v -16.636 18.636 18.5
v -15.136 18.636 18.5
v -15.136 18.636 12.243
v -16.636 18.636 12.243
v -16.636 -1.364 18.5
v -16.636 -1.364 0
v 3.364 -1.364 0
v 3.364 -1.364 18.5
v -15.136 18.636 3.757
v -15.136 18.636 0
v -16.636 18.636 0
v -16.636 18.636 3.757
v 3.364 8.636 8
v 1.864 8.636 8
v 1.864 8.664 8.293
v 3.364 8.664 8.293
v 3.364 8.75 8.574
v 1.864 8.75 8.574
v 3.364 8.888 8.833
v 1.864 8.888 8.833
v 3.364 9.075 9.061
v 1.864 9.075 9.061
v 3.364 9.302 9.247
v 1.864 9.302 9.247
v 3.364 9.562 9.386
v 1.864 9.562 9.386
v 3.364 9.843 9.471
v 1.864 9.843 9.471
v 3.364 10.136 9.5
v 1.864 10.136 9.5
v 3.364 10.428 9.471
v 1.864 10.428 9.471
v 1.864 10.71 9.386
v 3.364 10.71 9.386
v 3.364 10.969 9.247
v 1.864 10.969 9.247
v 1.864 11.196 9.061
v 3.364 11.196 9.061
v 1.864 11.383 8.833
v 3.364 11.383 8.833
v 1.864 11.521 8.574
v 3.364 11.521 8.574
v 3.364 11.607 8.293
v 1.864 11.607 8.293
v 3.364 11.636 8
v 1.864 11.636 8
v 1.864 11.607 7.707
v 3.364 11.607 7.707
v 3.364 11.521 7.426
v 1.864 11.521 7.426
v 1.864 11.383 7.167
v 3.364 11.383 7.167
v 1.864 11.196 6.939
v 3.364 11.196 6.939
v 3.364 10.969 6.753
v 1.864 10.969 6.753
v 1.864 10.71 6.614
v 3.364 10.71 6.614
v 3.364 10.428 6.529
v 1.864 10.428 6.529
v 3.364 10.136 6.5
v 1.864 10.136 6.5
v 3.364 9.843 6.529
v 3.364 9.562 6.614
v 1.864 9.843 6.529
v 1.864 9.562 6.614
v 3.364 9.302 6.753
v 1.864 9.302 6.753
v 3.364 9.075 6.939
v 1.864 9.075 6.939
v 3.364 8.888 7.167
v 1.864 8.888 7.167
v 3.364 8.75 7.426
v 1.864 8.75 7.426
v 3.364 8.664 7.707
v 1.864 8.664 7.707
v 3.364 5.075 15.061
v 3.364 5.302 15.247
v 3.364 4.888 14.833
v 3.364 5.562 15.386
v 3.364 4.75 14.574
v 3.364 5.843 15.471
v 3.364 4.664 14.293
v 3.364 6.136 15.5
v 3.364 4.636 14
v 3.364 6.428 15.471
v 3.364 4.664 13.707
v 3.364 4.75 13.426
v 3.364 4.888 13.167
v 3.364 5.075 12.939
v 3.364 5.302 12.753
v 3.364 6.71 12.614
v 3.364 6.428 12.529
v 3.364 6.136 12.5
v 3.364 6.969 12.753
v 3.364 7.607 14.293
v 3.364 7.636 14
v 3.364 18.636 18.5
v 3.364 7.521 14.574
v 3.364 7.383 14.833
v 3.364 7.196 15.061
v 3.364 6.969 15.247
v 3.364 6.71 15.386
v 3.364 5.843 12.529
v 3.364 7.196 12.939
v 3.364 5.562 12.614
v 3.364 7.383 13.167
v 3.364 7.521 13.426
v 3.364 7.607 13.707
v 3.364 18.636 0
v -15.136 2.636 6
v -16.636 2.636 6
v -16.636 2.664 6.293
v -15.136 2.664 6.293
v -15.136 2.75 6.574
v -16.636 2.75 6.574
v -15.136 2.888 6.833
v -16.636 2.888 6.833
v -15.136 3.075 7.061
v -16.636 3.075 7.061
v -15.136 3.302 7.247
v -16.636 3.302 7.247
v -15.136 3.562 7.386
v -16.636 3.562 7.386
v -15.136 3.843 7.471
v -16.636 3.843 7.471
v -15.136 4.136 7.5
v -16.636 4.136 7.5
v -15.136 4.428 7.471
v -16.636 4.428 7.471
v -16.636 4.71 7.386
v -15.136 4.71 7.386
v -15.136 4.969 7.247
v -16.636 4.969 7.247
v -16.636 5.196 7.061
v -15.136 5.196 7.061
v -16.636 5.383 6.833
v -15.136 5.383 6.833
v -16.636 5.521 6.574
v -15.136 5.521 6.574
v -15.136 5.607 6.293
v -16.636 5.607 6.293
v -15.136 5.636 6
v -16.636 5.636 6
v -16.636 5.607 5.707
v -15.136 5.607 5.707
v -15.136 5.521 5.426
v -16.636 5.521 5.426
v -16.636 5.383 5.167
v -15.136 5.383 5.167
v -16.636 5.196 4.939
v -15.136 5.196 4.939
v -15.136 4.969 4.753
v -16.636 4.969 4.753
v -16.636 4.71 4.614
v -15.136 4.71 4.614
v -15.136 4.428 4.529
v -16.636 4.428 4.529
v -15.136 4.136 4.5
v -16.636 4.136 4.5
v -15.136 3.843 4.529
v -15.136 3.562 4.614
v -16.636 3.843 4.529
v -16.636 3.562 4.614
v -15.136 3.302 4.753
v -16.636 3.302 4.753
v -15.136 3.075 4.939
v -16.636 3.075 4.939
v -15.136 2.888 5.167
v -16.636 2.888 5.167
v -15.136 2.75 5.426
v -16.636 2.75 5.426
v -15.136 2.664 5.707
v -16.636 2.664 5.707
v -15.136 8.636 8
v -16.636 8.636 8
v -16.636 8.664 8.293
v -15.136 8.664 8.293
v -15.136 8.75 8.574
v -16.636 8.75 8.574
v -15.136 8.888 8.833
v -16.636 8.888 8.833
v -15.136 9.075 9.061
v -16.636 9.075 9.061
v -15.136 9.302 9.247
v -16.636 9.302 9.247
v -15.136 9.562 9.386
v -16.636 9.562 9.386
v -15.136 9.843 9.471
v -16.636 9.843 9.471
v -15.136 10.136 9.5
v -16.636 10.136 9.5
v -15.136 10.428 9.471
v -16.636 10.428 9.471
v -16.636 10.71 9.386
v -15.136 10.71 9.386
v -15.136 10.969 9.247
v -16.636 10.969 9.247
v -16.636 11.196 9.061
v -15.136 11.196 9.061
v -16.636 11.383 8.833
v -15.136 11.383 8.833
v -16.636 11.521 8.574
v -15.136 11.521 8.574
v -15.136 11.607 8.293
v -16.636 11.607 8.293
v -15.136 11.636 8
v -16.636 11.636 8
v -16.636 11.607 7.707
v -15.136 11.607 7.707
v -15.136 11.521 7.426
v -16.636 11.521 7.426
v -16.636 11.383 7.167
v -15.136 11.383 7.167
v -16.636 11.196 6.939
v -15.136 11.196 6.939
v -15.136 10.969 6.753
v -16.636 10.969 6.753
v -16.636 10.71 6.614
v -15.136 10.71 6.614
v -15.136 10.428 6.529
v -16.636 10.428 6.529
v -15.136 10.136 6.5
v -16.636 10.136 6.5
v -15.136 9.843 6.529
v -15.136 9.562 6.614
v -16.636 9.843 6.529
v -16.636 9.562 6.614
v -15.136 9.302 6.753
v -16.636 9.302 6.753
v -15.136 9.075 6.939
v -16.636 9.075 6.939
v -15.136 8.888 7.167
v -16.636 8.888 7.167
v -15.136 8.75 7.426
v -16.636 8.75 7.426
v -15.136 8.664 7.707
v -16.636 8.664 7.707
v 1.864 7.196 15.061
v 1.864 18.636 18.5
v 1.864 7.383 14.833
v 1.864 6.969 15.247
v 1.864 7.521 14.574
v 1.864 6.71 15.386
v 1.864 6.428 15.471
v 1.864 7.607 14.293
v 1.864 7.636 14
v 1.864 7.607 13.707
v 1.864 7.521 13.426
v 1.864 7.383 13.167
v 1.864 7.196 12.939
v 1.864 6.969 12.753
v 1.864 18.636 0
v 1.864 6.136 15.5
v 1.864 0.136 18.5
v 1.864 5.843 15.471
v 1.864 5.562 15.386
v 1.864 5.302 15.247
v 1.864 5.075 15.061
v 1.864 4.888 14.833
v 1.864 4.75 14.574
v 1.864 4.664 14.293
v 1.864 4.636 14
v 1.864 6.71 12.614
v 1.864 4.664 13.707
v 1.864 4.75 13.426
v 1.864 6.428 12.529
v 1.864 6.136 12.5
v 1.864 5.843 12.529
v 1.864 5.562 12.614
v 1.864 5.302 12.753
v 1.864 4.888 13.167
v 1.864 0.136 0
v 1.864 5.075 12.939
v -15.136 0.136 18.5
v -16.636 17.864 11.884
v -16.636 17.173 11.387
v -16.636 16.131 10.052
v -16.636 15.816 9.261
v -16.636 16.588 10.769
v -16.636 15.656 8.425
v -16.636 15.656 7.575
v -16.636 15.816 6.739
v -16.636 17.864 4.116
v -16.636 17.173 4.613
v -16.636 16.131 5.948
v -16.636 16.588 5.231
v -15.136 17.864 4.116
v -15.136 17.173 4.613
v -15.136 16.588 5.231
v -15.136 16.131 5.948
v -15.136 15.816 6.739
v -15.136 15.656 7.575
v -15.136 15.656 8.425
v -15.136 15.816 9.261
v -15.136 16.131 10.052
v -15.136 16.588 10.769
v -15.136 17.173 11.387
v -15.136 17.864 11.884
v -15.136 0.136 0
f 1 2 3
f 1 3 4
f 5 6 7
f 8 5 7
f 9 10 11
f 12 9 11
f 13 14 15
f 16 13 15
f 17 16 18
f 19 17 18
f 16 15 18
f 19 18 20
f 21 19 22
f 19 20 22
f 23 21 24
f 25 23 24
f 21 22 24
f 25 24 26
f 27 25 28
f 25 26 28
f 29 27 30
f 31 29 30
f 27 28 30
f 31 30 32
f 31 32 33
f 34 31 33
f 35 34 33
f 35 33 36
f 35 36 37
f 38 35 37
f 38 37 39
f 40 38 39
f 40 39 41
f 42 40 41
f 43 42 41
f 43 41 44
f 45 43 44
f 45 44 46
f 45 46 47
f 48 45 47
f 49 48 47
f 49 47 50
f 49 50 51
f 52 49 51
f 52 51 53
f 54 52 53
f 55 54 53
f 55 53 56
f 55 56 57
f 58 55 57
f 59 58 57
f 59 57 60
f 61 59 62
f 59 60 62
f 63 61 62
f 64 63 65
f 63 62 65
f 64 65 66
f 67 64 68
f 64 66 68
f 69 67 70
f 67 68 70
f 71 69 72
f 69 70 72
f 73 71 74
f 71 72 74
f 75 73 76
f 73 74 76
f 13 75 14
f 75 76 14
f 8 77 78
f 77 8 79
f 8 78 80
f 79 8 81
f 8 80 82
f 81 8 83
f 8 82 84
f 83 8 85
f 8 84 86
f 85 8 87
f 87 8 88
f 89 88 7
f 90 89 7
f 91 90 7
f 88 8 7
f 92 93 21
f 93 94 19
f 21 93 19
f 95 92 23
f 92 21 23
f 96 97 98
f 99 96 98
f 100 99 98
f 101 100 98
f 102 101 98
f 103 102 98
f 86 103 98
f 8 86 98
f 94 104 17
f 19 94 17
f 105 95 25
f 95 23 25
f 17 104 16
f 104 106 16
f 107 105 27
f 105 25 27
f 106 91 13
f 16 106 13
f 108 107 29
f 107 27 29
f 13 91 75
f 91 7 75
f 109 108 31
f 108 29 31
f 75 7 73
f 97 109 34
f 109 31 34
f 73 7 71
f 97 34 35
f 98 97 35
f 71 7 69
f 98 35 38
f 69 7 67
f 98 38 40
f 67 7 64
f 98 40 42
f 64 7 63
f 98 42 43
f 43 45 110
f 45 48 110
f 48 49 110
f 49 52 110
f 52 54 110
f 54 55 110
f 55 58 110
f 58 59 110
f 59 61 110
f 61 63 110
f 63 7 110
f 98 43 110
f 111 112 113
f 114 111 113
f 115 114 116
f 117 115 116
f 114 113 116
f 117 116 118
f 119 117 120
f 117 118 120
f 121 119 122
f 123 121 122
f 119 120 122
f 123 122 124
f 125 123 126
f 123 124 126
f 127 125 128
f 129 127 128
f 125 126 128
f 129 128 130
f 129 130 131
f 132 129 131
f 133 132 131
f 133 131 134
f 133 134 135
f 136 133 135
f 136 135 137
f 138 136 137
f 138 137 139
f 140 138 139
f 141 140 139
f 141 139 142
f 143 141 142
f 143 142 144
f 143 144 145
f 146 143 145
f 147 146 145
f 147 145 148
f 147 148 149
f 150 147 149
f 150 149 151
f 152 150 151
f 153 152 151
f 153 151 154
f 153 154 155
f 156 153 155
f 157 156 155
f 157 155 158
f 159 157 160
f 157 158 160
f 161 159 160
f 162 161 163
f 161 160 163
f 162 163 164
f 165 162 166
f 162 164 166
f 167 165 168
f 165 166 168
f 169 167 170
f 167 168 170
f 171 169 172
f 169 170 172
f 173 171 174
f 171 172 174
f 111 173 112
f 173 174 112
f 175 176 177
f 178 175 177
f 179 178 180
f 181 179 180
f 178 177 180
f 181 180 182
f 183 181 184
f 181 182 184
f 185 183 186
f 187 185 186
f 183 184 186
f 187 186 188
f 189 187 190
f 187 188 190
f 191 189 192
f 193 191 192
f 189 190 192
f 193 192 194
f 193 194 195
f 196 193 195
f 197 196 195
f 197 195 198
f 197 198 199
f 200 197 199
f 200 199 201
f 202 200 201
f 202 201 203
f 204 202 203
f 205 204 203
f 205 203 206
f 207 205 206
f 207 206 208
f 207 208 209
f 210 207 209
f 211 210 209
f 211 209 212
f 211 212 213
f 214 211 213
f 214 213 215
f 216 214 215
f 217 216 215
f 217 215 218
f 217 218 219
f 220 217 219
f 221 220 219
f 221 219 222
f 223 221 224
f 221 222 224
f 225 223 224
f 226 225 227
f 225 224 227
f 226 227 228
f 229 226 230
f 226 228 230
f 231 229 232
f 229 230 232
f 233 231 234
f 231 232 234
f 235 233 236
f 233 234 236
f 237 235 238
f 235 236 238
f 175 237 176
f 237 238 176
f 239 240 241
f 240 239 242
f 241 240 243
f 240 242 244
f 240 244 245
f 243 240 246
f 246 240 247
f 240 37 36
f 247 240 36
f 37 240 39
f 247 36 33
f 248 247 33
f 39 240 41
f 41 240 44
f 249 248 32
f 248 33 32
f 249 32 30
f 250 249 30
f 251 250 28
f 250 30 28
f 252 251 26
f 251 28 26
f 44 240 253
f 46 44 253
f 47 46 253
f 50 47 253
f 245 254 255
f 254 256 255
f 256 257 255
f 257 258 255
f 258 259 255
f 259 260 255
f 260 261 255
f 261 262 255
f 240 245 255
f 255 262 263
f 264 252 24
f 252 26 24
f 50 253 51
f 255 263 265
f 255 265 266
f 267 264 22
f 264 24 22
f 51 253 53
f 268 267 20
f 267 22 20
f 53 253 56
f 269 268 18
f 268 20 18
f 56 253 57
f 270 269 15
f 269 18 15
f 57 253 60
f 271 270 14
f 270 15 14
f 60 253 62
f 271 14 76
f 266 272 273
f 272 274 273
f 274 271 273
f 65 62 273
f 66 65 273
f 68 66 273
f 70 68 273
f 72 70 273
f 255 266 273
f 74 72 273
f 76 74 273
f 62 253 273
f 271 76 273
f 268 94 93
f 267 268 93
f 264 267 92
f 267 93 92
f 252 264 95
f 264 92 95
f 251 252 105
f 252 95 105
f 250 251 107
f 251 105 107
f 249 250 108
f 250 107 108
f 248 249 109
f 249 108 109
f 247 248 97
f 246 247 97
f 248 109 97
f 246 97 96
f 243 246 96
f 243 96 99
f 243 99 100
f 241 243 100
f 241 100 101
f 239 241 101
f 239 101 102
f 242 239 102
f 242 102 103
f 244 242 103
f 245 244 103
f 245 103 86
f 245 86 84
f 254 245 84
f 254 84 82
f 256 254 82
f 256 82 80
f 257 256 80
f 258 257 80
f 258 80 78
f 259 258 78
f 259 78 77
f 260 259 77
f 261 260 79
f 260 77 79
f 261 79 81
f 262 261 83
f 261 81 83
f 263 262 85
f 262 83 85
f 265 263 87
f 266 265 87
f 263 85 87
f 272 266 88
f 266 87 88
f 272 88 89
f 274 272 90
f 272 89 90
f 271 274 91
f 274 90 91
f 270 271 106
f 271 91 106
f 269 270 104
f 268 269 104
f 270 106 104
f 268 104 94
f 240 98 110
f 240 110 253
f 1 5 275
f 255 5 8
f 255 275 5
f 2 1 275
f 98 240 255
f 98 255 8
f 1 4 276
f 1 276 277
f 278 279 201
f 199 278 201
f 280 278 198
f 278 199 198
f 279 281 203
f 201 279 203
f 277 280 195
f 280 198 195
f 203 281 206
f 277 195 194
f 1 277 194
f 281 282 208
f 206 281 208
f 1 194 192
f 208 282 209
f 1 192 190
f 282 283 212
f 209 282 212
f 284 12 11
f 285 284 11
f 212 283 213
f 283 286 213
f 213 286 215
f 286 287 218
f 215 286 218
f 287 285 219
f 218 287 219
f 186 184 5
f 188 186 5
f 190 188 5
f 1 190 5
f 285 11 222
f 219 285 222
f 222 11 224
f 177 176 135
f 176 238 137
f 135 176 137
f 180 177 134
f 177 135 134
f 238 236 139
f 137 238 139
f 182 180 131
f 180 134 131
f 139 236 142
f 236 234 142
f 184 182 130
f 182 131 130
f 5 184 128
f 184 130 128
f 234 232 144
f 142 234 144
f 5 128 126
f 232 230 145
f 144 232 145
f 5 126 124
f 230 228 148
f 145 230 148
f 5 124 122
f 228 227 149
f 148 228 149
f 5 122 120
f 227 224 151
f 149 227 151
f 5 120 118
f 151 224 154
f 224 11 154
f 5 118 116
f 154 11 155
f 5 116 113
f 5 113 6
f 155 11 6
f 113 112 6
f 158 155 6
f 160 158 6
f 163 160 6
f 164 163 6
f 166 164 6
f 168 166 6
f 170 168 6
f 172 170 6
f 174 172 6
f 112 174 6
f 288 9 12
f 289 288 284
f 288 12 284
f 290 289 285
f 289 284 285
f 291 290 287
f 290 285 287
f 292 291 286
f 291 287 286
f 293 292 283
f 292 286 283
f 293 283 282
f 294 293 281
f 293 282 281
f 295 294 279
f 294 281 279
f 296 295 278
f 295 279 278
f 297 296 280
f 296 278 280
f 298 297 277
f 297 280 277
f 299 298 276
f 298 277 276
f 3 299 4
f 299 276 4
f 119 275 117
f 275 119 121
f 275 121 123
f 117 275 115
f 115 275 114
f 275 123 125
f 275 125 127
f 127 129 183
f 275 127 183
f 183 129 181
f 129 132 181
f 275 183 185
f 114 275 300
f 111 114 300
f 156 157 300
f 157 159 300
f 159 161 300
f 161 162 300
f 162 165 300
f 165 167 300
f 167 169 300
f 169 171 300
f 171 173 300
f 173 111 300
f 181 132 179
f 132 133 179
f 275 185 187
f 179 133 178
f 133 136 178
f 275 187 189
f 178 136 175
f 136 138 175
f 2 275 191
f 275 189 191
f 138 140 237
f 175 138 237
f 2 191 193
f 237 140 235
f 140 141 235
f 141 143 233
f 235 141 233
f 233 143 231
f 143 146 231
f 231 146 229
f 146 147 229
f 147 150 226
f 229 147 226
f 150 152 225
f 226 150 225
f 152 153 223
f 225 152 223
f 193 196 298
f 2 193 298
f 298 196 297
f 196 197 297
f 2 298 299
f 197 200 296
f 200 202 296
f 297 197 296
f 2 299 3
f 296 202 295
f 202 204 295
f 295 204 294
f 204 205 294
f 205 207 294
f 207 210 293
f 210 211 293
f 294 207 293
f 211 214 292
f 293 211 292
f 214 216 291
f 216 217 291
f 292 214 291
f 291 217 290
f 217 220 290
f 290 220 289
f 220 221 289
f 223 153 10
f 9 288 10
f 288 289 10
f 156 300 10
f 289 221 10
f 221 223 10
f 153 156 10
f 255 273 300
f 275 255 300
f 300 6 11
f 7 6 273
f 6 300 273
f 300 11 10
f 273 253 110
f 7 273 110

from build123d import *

# Parameters (mm, degrees)
EXTRUSION1_DEPTH = 18.5
ESQUISSE2_R      = 1.5
EXTRUSION2_DEPTH = 5
ESQUISSE3_R      = 4.5
ESQUISSE3_R_2    = 1.5
EXTRUSION3_DEPTH = 5
ESQUISSE4_R      = 1.5
EXTRUSION4_DEPTH = 34.008102077


with BuildPart() as part:
    # Esquisse1 → Extrusion1 (new body)
    with BuildSketch(Plane.XY):
        Polygon((-16.636265327, 18.635578947), (-16.636265327, -1.364421053), (3.363734673, -1.364421053), (3.363734673, 18.635578947), (1.863734673, 18.635578947), (1.863734673, 0.135578947), (-15.136265327, 0.135578947), (-15.136265327, 18.635578947), align=None)
    extrude(amount=EXTRUSION1_DEPTH)

    # Esquisse2 → Extrusion2 (cut)
    with BuildSketch(Plane(origin=(3.363734673, 0, 0), x_dir=(0, 0, -1), z_dir=(1, 0, 0))):
        with Locations((-14, 6.135578947)):
            Circle(ESQUISSE2_R)
    extrude(amount=-EXTRUSION2_DEPTH, mode=Mode.SUBTRACT)

    # Esquisse3 → Extrusion3 (cut)
    with BuildSketch(Plane.ZY.offset(16.636265327)):
        with Locations((8, 20.135578947)):
            Circle(ESQUISSE3_R)
        with Locations(Location((6, 4.135578947, 0), (0, 0, 270))):
            Circle(ESQUISSE3_R_2)
    extrude(amount=-EXTRUSION3_DEPTH, mode=Mode.SUBTRACT)

    # Esquisse4 → Extrusion4 (cut, through all)
    with BuildSketch(Plane.ZY.offset(16.636265327)):
        with Locations(Location((8, 10.135578947, 0), (0, 0, 270))):
            Circle(ESQUISSE4_R)
    extrude(amount=-EXTRUSION4_DEPTH, mode=Mode.SUBTRACT)


solid = part.part
